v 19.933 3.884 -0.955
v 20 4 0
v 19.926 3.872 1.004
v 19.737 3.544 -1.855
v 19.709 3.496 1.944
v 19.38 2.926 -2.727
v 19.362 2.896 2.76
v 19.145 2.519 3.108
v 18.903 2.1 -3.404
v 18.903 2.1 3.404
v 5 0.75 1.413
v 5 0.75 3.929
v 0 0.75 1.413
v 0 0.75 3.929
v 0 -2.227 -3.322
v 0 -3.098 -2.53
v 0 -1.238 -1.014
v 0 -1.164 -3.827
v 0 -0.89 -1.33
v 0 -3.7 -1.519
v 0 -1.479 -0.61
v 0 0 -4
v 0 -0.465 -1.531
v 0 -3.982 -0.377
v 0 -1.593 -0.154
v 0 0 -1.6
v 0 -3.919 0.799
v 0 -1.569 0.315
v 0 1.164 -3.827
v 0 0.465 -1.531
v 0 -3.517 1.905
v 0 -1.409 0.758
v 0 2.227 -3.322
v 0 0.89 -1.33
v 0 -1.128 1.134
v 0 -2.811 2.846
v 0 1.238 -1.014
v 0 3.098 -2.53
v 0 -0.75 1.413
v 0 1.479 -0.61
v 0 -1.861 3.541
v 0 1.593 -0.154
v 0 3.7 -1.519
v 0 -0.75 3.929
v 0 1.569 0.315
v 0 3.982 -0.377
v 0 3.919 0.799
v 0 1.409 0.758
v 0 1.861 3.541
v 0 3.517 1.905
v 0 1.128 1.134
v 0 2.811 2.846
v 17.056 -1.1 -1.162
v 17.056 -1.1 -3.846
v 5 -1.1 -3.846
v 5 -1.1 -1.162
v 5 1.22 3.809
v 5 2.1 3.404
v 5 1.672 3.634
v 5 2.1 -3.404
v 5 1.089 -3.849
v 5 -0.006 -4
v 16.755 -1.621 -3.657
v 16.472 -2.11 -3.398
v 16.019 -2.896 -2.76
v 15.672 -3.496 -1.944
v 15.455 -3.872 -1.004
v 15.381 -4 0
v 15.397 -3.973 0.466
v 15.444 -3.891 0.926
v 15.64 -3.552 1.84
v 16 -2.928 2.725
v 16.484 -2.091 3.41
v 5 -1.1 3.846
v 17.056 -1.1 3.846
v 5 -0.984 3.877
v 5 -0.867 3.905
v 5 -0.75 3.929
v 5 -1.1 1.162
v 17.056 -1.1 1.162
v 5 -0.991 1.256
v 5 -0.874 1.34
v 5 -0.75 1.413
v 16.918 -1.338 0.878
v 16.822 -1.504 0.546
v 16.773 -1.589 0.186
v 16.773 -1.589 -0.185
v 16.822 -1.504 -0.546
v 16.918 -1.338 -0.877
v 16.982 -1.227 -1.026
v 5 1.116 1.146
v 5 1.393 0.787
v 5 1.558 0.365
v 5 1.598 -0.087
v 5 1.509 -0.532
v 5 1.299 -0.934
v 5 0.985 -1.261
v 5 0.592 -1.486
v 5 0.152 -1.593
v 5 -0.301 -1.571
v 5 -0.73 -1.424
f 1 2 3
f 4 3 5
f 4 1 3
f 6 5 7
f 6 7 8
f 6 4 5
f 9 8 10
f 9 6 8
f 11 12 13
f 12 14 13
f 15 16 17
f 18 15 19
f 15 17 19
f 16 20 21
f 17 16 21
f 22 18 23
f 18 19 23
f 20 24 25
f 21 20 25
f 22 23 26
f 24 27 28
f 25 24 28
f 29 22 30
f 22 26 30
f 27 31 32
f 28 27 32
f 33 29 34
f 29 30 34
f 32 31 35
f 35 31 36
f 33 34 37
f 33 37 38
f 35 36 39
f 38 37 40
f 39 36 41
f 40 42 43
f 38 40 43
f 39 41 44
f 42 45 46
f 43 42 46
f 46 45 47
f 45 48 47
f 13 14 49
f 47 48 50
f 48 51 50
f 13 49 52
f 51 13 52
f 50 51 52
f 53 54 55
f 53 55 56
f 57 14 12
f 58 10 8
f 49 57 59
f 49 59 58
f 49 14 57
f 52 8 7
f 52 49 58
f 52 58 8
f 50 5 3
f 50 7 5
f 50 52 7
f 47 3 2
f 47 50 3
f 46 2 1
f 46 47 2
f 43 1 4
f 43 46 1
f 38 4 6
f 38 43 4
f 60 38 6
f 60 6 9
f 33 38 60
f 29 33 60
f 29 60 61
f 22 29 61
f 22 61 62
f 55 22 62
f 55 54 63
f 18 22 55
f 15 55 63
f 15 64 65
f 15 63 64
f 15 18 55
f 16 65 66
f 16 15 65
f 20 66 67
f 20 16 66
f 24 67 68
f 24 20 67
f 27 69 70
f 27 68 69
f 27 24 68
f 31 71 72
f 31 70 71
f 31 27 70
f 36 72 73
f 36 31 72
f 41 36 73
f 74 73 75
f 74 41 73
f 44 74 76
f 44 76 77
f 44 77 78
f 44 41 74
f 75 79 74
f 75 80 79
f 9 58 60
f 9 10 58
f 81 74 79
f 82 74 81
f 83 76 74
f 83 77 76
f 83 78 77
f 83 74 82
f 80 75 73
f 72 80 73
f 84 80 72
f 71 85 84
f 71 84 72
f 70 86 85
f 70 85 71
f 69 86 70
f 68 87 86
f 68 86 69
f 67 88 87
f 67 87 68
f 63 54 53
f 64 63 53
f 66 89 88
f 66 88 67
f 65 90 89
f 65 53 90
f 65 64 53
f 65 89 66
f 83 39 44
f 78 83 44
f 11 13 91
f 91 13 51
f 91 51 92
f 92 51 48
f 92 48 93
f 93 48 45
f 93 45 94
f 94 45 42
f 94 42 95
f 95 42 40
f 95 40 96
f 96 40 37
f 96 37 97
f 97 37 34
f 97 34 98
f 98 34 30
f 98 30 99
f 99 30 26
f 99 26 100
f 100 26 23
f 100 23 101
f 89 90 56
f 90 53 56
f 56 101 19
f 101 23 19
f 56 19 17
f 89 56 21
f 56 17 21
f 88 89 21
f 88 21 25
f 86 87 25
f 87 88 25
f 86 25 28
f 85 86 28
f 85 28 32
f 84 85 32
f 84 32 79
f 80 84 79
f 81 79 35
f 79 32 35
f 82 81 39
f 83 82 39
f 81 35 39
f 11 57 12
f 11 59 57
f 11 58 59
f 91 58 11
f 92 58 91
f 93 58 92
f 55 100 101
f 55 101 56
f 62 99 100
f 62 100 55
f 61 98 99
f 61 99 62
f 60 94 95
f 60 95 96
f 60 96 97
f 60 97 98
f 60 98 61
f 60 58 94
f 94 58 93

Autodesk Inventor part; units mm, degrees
ref_plane "YZ Plane" through (0, 0, 0) normal (1, 0, 0) x (0, 1, 0)
ref_plane "XZ Plane" through (0, 0, 0) normal (0, 1, 0) x (-1, 0, 0)
ref_plane "XY Plane" through (0, 0, 0) normal (0, 0, 1) x (1, 0, 0)
sketch "Sketch1" plane through (0, 0, 0) normal (1, 0, 0) x (0, 1, 0)
  circle A0 centre (0, 0) radius 4
  dimension "d0" = 8
extrude "Extrusion1" add sketch "Sketch1" along normal blind 20
sketch "Sketch2" plane through (20, 0, 0) normal (1, 0, 0) x (0, 0, -1)
  line L0 (-4, 2.1) -> (4, 2.1)
  line L1 (4, 2.1) -> (4, -1.1)
  line L2 (4, -1.1) -> (-4, -1.1)
  line L3 (-4, -1.1) -> (-4, 2.1)
  point P0 (0, 0)
  dimension "d3" = 8
  dimension "d4" = 3.2
  dimension "d5" = 2.1
  dimension "d6" = 4
extrude "Extrusion2" cut sketch "Sketch2" against normal blind 15
sketch "Sketch3" plane through (0, 0, 0) normal (-1, 0, 0) x (0, 0, 1)
  circle A0 centre (0, 0) radius 1.6
  dimension "d9" = 3.2
extrude "Extrusion3" cut sketch "Sketch3" against normal through all
sketch "Sketch4" plane through (0, 0, 0) normal (0, 0, 1) x (1, 0, 0)
  line L0 (20, 2.1) -> (20, 4) projected
  line L1 (20, 4) -> (15.3812, -4)
  line L2 (0, -4) -> (20, -4) projected
  line L3 (20, 4) -> (29.2376, 4) construction
  line L4 (15.3812, -4) -> (20, -4)
  line L5 (20, 4) -> (20, -4)
  point P0 (0, 0)
  dimension "d12" = 120
extrude "Extrusion4" cut sketch "Sketch4" along normal through all both and the other way through all
sketch "Sketch6" plane through (0, 0, 0) normal (-1, 0, 0) x (0, 0, 1)
  line L0 (4, 0.75) -> (1.2, 0.75)
  line L1 (1.2, 0.75) -> (1.2, -0.75)
  line L2 (1.2, -0.75) -> (4, -0.75)
  line L3 (4, -0.75) -> (4, 0.75)
  point P0 (0, 0)
  dimension "d23" = 1.5
  dimension "d24" = 4
  dimension "d25" = 0.75
  dimension "d27" = 1.2
extrude "Extrusion6" cut sketch "Sketch6" against normal blind 10
equation "\"d6\" = 0.5 * d3"
equation "\"d25\" = 0.5 * d23"
properties part number "Main_tip_coupler"
